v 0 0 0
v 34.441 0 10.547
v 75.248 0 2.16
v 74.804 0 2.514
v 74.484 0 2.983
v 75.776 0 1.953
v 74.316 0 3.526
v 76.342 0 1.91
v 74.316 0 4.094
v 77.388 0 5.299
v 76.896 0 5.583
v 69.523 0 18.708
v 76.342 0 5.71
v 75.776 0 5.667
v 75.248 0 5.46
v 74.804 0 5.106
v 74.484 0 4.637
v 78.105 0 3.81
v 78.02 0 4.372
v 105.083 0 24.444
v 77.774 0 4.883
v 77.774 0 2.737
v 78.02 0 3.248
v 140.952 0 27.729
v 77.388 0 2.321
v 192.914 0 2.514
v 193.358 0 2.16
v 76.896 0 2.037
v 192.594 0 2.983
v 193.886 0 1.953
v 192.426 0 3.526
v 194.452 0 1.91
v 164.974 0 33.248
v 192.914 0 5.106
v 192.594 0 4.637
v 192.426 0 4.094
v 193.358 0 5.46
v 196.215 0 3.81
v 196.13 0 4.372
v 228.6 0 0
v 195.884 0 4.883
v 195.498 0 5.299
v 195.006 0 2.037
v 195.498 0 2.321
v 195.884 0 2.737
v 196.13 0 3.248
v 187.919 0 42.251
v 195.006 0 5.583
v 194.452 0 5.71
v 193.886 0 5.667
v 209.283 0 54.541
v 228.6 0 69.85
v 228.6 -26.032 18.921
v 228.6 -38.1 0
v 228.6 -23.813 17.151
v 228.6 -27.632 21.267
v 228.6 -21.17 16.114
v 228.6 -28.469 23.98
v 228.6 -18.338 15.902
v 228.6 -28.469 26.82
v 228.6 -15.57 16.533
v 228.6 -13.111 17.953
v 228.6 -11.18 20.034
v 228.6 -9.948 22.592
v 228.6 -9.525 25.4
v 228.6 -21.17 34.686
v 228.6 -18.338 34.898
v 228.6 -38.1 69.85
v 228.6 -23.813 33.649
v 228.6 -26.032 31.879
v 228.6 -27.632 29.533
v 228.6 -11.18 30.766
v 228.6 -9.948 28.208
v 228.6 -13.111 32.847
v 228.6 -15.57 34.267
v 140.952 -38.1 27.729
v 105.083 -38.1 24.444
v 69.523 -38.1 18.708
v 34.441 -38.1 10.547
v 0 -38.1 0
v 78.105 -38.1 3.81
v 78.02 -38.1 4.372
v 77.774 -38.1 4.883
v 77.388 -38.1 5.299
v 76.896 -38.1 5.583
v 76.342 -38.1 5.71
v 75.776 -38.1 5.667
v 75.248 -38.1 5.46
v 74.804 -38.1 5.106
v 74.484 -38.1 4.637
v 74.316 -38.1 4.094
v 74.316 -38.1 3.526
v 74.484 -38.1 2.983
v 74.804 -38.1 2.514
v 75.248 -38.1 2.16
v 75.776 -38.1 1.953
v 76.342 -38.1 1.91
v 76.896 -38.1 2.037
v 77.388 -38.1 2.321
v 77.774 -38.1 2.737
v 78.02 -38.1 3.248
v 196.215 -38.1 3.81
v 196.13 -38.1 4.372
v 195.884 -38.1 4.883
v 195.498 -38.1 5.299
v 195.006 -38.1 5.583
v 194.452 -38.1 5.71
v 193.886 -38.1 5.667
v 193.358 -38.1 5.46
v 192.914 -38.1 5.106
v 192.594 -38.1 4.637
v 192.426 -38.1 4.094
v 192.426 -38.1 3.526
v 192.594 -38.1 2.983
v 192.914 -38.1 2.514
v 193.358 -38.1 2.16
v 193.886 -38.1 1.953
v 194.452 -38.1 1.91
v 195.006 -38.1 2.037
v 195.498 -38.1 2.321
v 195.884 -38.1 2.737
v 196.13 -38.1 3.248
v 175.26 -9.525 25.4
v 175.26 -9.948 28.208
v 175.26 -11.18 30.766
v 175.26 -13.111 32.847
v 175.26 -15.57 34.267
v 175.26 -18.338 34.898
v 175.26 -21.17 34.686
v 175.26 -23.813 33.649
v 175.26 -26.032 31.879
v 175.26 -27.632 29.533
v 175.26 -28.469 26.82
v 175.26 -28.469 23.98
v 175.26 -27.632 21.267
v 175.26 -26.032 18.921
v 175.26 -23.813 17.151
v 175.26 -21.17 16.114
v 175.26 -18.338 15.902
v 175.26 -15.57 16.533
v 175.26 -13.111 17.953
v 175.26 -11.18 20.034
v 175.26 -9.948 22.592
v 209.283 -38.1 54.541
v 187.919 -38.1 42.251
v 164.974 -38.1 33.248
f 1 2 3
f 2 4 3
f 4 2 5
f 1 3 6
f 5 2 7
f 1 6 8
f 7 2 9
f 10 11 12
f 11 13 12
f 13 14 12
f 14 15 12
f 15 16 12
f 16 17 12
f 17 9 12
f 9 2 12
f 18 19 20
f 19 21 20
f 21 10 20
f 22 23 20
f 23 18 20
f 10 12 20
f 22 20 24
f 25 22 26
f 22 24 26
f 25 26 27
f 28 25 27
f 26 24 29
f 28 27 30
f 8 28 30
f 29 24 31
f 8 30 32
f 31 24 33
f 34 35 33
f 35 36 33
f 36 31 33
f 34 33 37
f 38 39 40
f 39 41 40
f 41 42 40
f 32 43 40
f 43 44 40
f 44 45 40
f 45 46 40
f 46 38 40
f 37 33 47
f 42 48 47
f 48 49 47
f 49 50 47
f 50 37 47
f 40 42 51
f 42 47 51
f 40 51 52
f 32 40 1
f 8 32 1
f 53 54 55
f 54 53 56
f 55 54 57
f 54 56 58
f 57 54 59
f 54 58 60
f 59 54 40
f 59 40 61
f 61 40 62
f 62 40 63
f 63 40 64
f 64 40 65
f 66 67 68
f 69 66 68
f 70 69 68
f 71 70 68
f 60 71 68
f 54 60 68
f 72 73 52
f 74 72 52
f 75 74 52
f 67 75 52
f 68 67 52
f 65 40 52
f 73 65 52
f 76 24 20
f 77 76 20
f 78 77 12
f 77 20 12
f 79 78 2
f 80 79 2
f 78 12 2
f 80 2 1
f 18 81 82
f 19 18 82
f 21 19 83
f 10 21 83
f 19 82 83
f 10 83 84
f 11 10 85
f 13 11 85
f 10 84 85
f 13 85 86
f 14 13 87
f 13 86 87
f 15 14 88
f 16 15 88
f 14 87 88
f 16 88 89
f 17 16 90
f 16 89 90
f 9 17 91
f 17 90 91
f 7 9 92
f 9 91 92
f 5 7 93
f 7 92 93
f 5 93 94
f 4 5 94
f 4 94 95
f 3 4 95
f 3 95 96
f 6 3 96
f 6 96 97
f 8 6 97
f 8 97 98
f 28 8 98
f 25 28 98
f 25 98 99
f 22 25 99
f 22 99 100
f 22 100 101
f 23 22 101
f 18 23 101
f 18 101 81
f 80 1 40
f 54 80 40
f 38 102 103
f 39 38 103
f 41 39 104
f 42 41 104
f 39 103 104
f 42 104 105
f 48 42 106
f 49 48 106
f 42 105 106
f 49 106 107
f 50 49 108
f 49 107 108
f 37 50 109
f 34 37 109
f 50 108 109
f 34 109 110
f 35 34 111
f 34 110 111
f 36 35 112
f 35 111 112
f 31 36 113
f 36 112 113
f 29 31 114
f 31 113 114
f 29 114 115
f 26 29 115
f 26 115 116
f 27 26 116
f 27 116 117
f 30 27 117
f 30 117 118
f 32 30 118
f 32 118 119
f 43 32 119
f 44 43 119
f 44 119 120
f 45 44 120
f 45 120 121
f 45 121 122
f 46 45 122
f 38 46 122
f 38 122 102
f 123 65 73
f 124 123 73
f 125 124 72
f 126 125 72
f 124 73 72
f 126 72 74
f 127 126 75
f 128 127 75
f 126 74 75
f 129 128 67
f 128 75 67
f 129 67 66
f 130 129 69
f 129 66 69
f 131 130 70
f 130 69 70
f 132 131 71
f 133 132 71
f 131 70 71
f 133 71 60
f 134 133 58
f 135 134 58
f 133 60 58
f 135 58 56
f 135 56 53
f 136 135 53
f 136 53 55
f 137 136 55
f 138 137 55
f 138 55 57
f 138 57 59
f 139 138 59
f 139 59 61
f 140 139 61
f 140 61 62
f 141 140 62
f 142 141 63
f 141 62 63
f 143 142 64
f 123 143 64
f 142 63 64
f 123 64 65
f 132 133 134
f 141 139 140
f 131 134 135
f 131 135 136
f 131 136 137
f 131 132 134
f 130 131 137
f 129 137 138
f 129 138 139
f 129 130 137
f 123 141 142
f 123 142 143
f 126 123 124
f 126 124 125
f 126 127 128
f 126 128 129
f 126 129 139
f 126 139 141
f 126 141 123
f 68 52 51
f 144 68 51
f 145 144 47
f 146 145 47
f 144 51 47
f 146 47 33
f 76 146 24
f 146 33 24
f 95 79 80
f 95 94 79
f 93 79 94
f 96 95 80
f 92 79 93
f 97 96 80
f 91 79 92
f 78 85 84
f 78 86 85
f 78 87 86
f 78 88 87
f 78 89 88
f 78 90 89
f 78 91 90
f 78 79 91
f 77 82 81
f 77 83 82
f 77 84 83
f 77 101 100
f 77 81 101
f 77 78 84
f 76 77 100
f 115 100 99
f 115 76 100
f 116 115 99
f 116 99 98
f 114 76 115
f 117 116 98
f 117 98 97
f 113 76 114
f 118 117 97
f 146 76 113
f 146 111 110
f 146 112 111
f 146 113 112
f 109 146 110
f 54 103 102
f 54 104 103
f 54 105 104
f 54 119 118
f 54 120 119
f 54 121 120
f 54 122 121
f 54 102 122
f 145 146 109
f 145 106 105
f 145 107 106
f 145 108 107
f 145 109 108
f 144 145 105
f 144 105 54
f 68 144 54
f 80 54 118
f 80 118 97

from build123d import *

# Parameters (mm, degrees)
F1_DEPTH = 38.1
F2_R     = 5.08
F3_DEPTH = 38.1
F4_R     = 9.525
F5_DEPTH = 53.34
F6_R     = 1.905
F7_DEPTH = 38.101
F8_DEPTH = 38.101


# Not quite as in the source:
# - a feature names something its author has since deleted; it is built from what else it names


with BuildPart() as f1:
    # F0 (on Front) → F1 (new body)
    with BuildSketch(Plane.XZ):
        with BuildLine():
            ThreePointArc((140.9522952768, 27.729119938), (69.5233725404, 18.7076937305), (0, 0))
            Line((0, 0), (228.6, 0))
            Line((228.6, 0), (228.6, 25.4))
            ThreePointArc((228.6, 25.4), (184.8248483375, 28.3972283618), (140.9522952768, 27.729119938))
        make_face()
    extrude(amount=F1_DEPTH)

    # F2
    f2_edges = [f1.edges().sort_by_distance(p)[0] for p in [
        (112.892107, 0, 25.371039),
        (112.892107, -38.1, 25.371039),
    ]]
    fillet(f2_edges, radius=F2_R)

    # F0 (on Front) → F3 (join)
    with BuildSketch(Plane.XZ):
        with BuildLine():
            ThreePointArc((140.9522952768, 27.729119938), (69.5233725404, 18.7076937305), (0, 0))
            Line((0, 0), (228.6, 0))
            Line((228.6, 0), (228.6, 25.4))
            ThreePointArc((228.6, 25.4), (184.8248483375, 28.3972283618), (140.9522952768, 27.729119938))
        make_face()
        with BuildLine():
            ThreePointArc((228.6, 69.85), (187.9185150392, 42.2507295914), (140.9522952768, 27.729119938))
            ThreePointArc((140.9522952768, 27.729119938), (184.8248483375, 28.3972283618), (228.6, 25.4))
            Line((228.6, 25.4), (228.6, 69.85))
        make_face()
    extrude(amount=F3_DEPTH)

    # F4 (on face) → F5 (cut)
    with BuildSketch(Plane.YZ.offset(228.6)):
        with Locations((-19.05, 25.4)):
            Circle(F4_R)
    extrude(amount=-F5_DEPTH, mode=Mode.SUBTRACT)

    # F6 (on face) → F7 (cut, through all)
    with BuildSketch(Plane.XZ.offset(38.1)):
        with Locations((76.2, 3.81)):
            Circle(F6_R)
    extrude(amount=-F7_DEPTH, mode=Mode.SUBTRACT)

    # F6 (on face) → F8 (cut, through all)
    with BuildSketch(Plane.XZ.offset(38.1)):
        with Locations((194.31, 3.81)):
            Circle(F6_R)
    extrude(amount=-F8_DEPTH, mode=Mode.SUBTRACT)


solid = f1.part
